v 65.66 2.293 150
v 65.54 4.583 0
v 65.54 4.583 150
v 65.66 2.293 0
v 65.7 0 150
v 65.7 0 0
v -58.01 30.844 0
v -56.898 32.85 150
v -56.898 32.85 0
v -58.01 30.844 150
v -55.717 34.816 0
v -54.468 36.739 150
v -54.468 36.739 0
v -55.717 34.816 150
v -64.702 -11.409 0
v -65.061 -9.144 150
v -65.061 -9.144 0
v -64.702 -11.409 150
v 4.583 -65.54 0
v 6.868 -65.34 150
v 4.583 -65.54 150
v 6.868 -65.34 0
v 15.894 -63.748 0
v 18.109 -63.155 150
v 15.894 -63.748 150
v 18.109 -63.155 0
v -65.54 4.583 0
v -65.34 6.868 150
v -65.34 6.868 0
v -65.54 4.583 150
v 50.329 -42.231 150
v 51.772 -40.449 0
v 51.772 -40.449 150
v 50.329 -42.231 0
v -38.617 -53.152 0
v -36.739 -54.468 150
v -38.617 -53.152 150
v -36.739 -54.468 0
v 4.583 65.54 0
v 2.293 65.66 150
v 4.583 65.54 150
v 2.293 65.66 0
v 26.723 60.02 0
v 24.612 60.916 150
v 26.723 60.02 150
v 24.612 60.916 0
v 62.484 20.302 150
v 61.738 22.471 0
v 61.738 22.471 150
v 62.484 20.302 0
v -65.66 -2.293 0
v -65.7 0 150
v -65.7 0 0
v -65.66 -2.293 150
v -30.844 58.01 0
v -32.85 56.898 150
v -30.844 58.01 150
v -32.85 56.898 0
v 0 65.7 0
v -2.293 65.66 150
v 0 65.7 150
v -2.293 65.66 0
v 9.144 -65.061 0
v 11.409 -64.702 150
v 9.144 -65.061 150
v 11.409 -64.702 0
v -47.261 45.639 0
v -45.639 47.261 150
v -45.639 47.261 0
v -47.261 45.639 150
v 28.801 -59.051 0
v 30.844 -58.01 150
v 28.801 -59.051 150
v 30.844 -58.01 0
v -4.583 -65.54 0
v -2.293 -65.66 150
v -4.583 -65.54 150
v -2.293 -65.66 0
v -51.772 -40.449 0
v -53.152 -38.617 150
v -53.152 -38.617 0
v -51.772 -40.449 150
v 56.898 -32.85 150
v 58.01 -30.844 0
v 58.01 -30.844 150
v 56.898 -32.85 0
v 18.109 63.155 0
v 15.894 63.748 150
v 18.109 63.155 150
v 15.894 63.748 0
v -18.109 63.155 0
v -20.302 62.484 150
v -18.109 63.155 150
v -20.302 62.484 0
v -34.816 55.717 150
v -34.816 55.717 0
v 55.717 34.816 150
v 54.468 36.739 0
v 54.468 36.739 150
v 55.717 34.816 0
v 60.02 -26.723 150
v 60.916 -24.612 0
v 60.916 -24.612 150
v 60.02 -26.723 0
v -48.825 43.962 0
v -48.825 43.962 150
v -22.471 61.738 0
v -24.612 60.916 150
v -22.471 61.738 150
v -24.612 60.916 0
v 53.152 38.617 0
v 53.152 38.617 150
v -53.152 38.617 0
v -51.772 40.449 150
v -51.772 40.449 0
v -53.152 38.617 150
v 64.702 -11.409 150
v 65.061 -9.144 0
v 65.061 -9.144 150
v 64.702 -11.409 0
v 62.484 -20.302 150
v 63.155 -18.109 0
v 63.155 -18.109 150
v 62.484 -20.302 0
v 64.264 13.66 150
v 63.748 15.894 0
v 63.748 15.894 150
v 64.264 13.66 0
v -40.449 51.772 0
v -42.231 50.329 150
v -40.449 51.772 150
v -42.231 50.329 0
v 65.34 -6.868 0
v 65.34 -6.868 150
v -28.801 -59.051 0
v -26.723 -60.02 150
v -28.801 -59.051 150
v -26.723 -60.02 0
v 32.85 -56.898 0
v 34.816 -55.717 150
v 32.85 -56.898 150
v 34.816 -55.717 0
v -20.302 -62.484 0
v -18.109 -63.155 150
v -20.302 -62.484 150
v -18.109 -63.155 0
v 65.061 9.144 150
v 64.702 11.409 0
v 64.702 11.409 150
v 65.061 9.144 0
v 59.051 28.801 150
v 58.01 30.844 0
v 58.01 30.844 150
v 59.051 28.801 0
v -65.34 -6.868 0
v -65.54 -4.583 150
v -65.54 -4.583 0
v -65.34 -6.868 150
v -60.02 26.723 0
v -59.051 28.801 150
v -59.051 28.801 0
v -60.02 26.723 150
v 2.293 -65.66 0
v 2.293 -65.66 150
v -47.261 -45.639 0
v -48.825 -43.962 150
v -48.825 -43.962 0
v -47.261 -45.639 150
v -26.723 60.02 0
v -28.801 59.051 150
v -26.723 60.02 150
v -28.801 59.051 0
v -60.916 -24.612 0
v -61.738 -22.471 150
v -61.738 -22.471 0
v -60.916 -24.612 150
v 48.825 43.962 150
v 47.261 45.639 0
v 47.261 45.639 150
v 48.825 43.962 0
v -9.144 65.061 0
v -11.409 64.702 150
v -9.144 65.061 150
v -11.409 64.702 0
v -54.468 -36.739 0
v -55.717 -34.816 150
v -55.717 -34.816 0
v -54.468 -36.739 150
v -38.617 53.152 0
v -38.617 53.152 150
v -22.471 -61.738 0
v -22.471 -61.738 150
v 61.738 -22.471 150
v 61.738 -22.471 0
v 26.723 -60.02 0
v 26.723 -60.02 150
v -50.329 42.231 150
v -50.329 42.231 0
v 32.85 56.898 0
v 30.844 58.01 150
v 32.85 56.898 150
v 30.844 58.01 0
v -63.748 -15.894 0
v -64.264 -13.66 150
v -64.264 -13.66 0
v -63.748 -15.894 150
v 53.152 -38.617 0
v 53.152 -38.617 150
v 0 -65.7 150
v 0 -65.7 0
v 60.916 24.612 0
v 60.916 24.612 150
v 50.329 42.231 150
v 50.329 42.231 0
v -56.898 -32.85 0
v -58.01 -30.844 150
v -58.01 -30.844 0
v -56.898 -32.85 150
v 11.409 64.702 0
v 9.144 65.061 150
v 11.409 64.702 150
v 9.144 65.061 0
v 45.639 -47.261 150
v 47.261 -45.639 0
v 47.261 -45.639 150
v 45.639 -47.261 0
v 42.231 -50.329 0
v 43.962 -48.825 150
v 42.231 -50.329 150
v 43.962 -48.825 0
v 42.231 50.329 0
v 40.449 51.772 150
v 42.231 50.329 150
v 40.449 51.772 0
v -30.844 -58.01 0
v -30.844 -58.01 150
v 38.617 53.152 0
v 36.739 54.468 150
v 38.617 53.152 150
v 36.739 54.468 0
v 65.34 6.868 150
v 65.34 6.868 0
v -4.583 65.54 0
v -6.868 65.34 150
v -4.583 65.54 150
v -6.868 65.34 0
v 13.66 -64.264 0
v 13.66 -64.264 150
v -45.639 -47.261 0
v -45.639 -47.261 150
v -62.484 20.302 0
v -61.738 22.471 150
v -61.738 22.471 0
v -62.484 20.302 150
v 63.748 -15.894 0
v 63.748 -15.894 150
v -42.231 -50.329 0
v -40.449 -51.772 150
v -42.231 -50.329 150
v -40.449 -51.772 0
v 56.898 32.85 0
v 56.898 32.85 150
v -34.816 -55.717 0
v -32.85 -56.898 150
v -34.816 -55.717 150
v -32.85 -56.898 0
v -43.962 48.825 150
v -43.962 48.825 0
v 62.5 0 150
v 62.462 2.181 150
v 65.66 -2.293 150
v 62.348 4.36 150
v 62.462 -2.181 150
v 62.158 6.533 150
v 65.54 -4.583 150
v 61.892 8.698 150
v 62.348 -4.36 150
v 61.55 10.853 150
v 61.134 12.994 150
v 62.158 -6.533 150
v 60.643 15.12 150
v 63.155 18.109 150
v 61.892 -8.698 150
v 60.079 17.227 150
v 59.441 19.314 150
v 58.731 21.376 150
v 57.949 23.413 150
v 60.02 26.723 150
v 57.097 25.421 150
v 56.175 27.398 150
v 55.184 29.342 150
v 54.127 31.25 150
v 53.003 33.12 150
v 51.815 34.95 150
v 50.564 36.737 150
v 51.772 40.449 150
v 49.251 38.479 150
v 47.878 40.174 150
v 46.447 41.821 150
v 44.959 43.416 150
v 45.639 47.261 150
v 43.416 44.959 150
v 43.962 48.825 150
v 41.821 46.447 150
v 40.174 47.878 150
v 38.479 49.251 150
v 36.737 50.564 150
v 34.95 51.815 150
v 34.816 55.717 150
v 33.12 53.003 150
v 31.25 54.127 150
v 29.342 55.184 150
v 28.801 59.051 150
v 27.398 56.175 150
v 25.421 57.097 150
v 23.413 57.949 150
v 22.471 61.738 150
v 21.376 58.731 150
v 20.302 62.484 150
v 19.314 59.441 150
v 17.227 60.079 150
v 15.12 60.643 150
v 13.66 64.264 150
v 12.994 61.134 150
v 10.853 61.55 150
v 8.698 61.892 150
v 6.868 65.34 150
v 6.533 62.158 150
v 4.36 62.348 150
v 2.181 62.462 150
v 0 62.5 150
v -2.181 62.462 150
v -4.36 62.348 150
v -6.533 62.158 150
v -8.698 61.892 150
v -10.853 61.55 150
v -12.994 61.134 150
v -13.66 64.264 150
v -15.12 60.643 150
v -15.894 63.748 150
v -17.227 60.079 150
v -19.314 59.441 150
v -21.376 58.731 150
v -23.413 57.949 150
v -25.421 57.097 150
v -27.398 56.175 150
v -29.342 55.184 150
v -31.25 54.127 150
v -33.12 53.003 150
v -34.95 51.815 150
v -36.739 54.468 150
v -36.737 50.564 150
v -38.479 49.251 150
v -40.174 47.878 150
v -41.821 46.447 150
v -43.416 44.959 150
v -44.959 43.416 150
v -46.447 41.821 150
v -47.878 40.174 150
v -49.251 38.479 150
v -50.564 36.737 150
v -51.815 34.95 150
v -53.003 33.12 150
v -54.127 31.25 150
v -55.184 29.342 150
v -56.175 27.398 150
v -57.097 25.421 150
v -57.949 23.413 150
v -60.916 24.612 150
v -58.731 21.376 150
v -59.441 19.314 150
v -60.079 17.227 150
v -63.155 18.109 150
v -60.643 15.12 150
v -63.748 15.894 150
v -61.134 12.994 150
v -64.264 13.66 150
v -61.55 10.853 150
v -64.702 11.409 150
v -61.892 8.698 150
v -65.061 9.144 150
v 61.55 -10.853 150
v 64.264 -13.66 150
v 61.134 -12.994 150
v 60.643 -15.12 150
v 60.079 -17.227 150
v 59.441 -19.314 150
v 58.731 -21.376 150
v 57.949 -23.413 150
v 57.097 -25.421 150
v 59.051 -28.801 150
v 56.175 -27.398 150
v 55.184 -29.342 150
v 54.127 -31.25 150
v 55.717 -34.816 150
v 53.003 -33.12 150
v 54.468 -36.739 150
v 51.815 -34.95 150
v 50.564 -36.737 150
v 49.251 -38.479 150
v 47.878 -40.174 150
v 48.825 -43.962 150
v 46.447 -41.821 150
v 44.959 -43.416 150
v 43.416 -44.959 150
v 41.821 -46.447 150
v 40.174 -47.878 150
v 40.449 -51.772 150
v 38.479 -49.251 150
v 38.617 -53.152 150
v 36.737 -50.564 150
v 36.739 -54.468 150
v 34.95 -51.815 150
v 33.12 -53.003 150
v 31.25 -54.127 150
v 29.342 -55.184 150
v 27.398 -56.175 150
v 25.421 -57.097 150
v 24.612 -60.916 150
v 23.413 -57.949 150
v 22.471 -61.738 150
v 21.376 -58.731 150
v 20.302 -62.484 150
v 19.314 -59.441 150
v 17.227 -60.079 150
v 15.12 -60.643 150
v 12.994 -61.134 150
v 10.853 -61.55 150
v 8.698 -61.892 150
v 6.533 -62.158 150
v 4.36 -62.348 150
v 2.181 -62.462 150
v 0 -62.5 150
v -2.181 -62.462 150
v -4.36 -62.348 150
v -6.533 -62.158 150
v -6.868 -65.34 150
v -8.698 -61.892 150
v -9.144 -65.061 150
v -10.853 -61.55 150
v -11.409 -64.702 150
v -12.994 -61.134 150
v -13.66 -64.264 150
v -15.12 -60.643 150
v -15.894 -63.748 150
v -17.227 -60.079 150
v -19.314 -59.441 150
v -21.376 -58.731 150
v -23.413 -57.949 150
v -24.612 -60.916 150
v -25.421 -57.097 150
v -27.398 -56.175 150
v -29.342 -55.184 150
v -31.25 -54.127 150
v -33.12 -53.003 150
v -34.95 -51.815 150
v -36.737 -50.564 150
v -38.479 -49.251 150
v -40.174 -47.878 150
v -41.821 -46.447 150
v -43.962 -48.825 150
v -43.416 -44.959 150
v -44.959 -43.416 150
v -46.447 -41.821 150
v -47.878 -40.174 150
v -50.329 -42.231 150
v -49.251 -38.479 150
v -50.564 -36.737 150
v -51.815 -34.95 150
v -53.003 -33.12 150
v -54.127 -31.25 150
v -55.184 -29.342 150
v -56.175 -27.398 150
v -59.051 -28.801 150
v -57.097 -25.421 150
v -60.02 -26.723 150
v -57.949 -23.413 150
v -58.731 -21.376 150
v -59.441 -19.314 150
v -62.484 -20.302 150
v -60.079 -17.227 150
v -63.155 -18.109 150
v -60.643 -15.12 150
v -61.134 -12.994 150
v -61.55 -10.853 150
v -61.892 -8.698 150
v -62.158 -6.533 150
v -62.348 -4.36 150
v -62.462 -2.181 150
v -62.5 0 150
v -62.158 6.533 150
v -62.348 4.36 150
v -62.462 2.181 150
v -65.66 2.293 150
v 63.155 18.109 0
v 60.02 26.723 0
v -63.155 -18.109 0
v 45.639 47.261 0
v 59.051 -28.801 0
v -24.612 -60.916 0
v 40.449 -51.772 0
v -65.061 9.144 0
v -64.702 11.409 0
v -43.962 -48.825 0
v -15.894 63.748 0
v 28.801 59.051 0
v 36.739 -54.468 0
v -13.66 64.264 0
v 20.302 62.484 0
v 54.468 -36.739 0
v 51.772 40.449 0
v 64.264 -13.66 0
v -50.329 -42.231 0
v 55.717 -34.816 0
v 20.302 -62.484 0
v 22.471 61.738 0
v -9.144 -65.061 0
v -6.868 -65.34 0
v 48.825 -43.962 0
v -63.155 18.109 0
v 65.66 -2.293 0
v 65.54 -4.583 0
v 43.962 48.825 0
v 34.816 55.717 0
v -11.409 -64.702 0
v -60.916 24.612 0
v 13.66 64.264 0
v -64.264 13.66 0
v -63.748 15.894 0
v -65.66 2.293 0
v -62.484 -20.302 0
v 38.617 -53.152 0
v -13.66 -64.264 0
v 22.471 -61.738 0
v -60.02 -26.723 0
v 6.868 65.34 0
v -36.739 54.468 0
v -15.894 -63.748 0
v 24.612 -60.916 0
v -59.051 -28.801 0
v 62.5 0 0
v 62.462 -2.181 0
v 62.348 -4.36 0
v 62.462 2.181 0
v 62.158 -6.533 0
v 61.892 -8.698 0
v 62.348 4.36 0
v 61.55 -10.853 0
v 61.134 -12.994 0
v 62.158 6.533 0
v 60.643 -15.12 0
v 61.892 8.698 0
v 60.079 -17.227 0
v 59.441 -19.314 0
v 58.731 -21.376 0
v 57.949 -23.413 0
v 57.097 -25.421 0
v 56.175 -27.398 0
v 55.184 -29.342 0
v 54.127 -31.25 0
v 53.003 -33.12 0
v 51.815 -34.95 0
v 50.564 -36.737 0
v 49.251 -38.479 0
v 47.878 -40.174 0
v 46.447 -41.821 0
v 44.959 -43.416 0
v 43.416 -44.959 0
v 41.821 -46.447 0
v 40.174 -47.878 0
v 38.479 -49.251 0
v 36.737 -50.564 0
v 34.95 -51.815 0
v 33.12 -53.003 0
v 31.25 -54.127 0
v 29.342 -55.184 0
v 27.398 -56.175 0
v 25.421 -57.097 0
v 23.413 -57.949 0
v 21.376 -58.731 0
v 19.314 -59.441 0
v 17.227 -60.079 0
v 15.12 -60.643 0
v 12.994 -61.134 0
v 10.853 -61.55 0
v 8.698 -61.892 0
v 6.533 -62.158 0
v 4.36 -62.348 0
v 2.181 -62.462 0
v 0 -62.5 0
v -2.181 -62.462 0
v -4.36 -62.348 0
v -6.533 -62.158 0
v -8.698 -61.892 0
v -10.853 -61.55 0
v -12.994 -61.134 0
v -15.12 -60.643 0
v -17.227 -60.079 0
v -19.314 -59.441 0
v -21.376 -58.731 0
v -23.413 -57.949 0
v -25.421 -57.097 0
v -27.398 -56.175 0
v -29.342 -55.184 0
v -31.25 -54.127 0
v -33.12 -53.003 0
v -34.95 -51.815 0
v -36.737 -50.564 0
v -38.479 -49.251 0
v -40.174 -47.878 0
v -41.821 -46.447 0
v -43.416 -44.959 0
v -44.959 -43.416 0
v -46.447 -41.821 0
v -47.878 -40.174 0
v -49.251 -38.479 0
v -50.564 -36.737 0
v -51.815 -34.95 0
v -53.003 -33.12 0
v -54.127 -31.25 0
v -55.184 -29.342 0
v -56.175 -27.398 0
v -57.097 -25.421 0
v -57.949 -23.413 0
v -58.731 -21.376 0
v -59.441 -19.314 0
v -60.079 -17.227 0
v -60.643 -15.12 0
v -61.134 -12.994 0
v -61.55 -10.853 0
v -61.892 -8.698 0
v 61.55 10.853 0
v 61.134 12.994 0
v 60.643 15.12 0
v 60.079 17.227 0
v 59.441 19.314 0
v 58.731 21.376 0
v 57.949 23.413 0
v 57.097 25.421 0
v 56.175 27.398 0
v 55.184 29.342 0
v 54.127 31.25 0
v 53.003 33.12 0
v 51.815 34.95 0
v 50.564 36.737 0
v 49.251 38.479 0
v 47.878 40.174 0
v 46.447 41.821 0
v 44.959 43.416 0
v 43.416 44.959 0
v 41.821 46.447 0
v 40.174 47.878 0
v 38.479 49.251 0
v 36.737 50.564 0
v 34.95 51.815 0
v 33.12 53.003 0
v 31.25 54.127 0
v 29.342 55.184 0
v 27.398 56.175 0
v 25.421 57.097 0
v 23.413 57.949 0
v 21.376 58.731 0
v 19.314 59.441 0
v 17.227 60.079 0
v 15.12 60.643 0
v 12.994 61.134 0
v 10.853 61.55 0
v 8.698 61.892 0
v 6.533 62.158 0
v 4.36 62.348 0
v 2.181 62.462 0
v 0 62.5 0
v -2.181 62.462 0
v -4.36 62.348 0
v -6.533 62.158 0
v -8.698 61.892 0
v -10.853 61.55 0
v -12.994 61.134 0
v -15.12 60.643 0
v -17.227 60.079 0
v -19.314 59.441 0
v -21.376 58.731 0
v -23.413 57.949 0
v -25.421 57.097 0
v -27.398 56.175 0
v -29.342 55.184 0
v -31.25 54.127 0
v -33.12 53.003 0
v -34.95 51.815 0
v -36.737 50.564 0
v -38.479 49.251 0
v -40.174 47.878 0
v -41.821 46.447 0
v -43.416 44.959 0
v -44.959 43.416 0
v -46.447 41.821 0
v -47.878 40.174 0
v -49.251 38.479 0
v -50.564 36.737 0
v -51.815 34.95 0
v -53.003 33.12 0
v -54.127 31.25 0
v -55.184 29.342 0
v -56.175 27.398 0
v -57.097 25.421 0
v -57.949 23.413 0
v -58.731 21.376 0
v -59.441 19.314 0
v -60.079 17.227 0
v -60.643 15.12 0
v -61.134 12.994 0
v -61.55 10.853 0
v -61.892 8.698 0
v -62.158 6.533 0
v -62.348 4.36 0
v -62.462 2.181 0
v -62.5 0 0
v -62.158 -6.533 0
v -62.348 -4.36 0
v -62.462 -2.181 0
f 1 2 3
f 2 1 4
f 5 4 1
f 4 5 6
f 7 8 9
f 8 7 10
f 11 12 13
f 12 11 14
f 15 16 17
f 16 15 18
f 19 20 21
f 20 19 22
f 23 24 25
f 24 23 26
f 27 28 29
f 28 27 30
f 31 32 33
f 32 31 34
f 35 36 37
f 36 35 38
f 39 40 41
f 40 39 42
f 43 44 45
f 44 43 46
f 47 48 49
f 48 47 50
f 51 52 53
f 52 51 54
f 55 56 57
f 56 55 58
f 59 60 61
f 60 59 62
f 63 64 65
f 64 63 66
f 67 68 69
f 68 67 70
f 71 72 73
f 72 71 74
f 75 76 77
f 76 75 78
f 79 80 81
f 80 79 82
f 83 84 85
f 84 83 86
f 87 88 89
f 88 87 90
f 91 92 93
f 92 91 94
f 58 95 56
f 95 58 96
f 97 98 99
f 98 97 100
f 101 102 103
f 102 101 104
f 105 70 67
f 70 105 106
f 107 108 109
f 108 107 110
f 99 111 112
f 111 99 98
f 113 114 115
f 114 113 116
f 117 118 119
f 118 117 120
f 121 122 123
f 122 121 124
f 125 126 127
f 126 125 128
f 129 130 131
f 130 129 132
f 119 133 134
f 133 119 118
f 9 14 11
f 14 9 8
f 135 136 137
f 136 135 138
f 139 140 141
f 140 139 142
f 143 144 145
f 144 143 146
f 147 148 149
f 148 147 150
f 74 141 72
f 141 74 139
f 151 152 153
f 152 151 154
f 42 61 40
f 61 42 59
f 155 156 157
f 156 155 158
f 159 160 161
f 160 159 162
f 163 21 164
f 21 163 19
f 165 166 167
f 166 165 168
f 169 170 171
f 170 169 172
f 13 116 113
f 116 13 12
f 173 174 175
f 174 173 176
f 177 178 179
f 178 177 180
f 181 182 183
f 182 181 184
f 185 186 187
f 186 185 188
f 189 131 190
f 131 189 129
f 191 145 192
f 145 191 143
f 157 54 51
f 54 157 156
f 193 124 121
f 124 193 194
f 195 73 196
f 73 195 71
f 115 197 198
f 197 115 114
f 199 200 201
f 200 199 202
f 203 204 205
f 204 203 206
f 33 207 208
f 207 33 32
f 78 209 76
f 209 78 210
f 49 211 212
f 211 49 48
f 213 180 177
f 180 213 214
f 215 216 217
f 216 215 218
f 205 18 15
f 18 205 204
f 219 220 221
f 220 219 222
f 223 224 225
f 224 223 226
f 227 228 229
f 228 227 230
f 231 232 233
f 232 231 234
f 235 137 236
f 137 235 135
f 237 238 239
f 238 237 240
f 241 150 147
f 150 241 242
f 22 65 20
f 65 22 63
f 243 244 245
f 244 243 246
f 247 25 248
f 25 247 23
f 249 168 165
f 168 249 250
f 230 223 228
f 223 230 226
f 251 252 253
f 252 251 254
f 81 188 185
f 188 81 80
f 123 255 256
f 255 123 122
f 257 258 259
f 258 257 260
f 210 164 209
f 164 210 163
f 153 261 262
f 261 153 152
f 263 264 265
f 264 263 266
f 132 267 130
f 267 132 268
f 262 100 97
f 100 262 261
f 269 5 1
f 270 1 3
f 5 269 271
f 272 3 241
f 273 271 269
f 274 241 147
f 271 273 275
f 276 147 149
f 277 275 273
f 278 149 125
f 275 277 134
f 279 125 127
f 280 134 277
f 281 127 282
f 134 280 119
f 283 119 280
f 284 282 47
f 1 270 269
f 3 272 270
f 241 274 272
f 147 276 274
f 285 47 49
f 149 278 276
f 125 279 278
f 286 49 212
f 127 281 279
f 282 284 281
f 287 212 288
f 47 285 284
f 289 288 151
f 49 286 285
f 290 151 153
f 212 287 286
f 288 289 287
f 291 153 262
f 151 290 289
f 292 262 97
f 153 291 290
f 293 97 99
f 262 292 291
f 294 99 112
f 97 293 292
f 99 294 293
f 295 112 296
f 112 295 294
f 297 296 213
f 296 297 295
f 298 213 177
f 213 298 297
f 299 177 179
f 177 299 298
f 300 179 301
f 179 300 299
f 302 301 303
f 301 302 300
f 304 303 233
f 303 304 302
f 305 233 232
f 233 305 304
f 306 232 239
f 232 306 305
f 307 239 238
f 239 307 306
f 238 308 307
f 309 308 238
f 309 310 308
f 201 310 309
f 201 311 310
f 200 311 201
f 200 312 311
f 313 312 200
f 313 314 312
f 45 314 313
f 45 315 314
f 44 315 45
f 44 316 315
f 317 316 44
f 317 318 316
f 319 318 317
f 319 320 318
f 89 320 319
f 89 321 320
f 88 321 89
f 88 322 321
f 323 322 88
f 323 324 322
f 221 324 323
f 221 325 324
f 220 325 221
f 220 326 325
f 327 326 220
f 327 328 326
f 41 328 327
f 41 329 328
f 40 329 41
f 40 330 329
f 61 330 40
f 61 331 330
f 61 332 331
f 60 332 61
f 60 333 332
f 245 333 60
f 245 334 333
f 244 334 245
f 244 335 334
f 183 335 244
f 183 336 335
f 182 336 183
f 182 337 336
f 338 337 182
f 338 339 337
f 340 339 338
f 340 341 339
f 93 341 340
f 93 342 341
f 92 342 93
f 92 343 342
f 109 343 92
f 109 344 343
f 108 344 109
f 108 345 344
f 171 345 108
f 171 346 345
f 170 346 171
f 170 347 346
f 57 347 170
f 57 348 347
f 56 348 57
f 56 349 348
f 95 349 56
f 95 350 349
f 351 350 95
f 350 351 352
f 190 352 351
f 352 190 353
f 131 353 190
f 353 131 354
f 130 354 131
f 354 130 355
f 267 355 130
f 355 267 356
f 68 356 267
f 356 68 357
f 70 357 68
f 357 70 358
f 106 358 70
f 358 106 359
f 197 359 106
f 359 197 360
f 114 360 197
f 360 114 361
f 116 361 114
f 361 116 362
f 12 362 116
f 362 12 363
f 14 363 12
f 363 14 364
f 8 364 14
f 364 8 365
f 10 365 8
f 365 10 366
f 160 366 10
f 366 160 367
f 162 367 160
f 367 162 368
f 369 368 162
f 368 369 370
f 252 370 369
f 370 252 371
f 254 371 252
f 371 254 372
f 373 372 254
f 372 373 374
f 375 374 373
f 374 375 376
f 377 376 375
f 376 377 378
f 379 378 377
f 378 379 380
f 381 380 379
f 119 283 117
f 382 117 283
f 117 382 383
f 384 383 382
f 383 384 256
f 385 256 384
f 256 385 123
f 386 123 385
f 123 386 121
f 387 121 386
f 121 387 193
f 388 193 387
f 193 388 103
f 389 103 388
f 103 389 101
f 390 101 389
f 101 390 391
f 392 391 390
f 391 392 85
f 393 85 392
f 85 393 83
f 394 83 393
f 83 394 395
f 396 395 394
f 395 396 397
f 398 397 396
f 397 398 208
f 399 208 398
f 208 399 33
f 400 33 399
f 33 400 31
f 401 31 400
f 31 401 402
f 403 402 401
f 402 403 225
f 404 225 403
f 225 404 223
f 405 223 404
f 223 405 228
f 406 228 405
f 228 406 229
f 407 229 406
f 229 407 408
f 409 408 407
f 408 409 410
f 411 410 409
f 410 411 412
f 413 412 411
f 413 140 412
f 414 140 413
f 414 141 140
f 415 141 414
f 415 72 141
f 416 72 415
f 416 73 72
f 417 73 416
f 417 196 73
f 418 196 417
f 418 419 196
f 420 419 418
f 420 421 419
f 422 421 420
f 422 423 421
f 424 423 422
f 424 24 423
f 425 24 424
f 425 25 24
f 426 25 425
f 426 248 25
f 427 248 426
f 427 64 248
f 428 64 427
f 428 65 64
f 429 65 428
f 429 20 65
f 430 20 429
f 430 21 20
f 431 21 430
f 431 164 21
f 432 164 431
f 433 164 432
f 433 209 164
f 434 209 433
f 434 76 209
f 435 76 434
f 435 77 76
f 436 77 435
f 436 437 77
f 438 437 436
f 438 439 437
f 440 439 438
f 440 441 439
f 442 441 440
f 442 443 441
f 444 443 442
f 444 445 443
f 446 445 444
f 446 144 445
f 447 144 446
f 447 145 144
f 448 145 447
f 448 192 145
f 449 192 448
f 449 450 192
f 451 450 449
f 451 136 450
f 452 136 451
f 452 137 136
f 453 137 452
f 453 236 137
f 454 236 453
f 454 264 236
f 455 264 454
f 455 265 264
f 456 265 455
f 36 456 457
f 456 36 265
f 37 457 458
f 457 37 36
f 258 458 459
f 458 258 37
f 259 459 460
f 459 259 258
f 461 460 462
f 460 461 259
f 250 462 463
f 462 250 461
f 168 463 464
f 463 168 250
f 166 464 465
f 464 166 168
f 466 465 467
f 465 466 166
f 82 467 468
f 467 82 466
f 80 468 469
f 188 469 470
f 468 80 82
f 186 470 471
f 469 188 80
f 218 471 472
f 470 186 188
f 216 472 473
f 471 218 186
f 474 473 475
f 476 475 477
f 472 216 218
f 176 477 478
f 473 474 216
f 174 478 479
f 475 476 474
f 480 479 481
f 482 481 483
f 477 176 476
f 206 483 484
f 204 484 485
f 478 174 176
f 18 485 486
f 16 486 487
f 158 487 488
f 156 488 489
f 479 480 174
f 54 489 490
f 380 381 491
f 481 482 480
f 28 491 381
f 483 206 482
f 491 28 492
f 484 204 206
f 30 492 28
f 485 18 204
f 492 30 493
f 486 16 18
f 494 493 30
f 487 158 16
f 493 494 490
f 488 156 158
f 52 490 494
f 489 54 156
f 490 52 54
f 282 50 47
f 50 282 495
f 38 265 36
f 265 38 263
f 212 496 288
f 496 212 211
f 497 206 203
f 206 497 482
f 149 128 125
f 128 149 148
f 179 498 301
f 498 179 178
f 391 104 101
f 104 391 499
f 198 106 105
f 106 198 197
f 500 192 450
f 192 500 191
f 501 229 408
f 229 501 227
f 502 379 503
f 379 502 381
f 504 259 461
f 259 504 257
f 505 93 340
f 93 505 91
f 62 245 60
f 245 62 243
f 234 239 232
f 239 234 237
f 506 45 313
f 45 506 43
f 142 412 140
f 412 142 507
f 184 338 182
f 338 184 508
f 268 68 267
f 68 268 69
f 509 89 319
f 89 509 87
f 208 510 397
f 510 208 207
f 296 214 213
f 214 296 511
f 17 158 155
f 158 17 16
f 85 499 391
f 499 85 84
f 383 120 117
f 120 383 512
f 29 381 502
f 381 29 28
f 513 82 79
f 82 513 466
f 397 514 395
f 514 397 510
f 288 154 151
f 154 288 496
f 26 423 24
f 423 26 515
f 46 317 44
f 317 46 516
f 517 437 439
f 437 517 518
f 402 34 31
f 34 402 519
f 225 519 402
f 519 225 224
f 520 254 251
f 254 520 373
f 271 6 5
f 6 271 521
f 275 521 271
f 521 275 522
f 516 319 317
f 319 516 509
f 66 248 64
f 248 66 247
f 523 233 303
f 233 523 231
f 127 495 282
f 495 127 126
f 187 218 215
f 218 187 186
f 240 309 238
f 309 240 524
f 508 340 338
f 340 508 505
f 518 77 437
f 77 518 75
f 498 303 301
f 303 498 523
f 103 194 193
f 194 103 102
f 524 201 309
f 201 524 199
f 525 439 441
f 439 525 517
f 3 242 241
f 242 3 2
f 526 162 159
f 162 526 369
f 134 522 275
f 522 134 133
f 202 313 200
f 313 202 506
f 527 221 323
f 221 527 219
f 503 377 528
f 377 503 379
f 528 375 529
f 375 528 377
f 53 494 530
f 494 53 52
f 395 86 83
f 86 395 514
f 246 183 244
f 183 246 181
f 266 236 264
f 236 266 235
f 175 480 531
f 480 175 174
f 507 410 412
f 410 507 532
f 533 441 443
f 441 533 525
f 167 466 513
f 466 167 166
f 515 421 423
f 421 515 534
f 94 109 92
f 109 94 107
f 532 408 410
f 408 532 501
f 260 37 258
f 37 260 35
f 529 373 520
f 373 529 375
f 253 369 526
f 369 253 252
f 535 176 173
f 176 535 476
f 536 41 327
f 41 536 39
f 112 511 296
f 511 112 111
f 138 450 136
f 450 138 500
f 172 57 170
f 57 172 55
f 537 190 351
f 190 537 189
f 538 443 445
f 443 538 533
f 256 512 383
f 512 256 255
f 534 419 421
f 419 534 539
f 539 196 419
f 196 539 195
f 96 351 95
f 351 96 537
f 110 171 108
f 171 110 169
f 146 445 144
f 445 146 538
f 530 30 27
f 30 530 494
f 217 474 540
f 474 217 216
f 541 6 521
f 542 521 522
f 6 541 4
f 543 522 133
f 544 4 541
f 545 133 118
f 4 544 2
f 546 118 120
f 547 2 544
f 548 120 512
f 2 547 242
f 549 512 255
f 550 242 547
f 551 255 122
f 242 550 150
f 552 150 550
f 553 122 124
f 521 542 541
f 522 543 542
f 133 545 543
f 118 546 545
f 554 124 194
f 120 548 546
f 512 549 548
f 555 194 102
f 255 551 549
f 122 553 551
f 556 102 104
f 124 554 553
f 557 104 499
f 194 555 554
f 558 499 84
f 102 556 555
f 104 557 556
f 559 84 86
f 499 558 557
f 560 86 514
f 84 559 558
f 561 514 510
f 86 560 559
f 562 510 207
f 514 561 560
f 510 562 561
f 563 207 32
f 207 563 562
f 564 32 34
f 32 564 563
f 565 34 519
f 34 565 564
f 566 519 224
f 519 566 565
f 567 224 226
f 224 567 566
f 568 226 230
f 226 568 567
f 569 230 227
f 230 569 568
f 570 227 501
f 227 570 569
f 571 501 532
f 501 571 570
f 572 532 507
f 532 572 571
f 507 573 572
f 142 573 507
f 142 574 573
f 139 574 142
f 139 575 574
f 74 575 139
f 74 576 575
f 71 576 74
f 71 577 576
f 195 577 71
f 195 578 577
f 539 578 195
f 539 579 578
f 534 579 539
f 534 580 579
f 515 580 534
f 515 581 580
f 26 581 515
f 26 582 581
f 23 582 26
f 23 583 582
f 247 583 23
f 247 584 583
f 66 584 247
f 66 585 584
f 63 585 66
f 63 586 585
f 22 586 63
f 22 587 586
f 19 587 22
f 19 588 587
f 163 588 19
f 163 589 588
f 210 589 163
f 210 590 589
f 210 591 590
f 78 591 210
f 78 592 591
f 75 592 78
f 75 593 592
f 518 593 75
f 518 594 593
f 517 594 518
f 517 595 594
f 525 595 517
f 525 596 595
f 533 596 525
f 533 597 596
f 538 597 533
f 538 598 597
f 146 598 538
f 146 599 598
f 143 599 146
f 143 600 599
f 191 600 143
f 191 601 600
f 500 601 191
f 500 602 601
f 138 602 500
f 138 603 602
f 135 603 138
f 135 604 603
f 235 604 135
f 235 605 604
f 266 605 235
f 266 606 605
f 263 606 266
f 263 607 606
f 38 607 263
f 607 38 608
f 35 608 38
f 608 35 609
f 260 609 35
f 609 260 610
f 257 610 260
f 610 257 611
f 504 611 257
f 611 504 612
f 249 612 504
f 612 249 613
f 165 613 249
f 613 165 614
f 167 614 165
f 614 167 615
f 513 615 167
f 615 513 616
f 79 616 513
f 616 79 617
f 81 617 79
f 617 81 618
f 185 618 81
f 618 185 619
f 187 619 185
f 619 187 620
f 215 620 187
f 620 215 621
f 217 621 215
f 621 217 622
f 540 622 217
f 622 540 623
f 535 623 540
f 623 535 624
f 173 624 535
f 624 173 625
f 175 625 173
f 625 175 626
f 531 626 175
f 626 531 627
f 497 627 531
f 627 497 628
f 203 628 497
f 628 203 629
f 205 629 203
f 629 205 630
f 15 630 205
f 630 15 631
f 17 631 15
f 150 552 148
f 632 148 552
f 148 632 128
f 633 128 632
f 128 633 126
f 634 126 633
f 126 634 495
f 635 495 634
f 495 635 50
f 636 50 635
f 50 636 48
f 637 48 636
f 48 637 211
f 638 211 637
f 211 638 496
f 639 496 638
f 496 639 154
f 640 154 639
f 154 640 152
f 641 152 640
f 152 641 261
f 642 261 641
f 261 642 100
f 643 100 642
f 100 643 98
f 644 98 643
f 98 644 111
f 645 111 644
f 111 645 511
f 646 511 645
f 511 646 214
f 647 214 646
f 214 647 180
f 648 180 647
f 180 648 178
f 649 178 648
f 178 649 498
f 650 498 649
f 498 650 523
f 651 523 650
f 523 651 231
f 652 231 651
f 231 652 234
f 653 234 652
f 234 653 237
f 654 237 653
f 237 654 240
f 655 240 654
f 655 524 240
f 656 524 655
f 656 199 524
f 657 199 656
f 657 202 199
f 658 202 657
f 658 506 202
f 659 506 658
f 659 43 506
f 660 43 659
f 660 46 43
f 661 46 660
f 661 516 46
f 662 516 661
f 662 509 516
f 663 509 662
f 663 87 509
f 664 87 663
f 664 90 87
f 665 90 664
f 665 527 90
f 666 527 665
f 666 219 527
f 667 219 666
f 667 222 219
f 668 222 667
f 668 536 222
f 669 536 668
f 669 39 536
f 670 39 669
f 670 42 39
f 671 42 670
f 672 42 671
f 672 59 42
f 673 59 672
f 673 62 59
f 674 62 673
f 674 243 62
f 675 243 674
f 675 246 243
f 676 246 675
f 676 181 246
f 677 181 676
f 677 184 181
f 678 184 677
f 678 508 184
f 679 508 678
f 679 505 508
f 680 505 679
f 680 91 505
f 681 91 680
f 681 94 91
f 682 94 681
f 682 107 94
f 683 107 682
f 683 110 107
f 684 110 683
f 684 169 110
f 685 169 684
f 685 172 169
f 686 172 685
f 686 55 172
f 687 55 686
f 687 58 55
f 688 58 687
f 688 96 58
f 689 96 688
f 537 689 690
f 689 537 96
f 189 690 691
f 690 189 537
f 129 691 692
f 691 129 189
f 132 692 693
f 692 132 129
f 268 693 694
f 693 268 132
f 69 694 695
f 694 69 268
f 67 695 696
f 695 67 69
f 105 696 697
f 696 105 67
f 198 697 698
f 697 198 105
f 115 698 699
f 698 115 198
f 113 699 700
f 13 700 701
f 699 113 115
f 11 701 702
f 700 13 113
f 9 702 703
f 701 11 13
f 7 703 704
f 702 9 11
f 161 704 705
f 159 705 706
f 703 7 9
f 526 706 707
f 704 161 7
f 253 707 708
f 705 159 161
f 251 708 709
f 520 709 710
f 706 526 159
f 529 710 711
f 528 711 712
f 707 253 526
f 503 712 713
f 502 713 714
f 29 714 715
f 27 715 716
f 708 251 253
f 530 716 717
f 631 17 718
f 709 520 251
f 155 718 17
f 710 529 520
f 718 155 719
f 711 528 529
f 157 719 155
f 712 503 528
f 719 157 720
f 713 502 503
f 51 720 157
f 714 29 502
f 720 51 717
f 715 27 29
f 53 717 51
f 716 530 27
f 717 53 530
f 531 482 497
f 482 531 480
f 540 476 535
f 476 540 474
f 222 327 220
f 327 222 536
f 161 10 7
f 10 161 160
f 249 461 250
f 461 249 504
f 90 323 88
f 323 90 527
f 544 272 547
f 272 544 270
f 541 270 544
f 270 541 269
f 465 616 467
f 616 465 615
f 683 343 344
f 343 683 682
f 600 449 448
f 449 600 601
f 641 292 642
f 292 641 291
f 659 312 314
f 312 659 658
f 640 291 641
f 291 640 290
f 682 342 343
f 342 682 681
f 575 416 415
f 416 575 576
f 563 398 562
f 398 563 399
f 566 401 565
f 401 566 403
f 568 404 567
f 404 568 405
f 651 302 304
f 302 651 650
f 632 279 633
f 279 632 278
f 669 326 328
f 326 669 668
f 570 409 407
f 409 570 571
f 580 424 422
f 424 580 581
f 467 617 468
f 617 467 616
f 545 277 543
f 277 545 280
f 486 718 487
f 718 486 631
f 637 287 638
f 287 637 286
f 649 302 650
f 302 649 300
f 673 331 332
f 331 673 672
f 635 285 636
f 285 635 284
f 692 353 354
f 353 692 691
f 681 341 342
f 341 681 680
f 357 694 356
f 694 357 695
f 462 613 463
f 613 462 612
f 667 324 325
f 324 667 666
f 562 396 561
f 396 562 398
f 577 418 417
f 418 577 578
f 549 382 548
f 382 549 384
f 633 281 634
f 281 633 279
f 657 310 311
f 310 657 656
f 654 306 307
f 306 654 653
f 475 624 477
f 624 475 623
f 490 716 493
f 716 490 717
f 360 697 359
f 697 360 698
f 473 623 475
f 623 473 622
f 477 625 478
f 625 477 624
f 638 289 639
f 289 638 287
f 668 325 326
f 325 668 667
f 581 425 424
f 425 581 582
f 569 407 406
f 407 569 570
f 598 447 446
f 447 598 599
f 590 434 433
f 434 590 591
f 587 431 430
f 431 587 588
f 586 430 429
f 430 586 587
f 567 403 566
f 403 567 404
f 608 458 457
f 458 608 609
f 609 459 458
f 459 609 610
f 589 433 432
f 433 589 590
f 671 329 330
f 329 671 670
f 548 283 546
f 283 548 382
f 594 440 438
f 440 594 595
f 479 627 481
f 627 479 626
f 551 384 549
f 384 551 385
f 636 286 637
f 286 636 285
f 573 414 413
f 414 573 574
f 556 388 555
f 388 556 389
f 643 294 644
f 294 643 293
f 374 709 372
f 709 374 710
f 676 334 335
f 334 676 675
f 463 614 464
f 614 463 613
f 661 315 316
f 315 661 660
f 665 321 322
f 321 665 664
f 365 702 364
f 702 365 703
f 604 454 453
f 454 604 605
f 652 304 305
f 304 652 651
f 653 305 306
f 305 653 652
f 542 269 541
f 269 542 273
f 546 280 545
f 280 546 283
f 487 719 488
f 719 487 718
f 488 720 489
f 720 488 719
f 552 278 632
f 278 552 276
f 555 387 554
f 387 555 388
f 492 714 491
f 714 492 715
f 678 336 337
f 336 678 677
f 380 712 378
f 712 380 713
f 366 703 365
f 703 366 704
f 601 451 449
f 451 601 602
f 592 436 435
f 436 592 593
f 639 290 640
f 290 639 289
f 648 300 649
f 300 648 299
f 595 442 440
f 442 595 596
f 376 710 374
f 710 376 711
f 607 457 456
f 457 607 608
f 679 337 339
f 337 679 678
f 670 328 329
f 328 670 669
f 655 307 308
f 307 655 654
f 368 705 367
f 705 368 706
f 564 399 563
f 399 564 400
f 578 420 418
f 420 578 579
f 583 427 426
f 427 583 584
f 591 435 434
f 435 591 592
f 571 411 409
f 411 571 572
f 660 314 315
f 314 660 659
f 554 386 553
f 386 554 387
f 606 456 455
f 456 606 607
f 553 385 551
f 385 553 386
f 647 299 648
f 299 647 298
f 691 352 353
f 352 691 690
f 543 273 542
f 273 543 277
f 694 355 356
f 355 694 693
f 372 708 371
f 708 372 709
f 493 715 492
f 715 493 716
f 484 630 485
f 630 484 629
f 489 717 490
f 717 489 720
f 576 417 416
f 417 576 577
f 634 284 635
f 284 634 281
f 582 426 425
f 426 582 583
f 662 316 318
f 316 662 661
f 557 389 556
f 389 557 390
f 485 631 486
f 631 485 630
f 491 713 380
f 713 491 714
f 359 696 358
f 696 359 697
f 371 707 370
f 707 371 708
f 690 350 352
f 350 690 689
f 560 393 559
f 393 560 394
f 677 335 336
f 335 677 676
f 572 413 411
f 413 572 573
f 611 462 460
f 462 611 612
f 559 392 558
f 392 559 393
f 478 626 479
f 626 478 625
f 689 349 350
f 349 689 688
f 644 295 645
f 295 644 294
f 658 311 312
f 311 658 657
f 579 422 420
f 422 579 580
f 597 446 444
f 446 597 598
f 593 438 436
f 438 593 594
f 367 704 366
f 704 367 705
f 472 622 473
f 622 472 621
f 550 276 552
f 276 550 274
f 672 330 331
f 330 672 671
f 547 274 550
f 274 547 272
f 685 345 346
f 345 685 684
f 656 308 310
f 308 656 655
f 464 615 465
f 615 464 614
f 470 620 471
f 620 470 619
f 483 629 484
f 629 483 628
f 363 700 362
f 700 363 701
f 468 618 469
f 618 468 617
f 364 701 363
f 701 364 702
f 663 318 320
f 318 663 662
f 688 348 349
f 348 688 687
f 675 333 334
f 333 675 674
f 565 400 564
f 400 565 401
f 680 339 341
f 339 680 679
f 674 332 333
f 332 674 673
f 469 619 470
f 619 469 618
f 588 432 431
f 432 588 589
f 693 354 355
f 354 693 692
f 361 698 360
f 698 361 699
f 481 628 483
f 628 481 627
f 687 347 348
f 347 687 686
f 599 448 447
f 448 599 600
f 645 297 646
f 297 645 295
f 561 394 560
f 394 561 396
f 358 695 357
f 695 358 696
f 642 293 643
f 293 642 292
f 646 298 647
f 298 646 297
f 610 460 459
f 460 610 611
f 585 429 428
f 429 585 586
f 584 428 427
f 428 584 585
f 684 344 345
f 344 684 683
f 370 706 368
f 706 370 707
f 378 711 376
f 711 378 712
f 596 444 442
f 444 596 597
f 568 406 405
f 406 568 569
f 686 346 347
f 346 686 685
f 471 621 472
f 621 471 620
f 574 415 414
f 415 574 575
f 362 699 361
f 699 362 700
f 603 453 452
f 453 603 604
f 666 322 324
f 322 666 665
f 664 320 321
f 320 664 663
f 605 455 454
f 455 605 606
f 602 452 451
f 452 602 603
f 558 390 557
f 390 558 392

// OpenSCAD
$fn = 180;

// HT pipe (approximation)
// "HT 125" interpreted as nominal DN125 with ~125 mm inner diameter.
// Length: 150 mm.
dn_inner = 125;          // mm (inner diameter)
wall = 3.2;              // mm (typical HT wall thickness approximation)
length = 150;            // mm

id = dn_inner;
od = id + 2*wall;

module ht_pipe(id, od, length){
    difference(){
        cylinder(h=length, d=od, center=false);
        translate([0,0,-0.1])
            cylinder(h=length+0.2, d=id, center=false);
    }
}

ht_pipe(id, od, length);
